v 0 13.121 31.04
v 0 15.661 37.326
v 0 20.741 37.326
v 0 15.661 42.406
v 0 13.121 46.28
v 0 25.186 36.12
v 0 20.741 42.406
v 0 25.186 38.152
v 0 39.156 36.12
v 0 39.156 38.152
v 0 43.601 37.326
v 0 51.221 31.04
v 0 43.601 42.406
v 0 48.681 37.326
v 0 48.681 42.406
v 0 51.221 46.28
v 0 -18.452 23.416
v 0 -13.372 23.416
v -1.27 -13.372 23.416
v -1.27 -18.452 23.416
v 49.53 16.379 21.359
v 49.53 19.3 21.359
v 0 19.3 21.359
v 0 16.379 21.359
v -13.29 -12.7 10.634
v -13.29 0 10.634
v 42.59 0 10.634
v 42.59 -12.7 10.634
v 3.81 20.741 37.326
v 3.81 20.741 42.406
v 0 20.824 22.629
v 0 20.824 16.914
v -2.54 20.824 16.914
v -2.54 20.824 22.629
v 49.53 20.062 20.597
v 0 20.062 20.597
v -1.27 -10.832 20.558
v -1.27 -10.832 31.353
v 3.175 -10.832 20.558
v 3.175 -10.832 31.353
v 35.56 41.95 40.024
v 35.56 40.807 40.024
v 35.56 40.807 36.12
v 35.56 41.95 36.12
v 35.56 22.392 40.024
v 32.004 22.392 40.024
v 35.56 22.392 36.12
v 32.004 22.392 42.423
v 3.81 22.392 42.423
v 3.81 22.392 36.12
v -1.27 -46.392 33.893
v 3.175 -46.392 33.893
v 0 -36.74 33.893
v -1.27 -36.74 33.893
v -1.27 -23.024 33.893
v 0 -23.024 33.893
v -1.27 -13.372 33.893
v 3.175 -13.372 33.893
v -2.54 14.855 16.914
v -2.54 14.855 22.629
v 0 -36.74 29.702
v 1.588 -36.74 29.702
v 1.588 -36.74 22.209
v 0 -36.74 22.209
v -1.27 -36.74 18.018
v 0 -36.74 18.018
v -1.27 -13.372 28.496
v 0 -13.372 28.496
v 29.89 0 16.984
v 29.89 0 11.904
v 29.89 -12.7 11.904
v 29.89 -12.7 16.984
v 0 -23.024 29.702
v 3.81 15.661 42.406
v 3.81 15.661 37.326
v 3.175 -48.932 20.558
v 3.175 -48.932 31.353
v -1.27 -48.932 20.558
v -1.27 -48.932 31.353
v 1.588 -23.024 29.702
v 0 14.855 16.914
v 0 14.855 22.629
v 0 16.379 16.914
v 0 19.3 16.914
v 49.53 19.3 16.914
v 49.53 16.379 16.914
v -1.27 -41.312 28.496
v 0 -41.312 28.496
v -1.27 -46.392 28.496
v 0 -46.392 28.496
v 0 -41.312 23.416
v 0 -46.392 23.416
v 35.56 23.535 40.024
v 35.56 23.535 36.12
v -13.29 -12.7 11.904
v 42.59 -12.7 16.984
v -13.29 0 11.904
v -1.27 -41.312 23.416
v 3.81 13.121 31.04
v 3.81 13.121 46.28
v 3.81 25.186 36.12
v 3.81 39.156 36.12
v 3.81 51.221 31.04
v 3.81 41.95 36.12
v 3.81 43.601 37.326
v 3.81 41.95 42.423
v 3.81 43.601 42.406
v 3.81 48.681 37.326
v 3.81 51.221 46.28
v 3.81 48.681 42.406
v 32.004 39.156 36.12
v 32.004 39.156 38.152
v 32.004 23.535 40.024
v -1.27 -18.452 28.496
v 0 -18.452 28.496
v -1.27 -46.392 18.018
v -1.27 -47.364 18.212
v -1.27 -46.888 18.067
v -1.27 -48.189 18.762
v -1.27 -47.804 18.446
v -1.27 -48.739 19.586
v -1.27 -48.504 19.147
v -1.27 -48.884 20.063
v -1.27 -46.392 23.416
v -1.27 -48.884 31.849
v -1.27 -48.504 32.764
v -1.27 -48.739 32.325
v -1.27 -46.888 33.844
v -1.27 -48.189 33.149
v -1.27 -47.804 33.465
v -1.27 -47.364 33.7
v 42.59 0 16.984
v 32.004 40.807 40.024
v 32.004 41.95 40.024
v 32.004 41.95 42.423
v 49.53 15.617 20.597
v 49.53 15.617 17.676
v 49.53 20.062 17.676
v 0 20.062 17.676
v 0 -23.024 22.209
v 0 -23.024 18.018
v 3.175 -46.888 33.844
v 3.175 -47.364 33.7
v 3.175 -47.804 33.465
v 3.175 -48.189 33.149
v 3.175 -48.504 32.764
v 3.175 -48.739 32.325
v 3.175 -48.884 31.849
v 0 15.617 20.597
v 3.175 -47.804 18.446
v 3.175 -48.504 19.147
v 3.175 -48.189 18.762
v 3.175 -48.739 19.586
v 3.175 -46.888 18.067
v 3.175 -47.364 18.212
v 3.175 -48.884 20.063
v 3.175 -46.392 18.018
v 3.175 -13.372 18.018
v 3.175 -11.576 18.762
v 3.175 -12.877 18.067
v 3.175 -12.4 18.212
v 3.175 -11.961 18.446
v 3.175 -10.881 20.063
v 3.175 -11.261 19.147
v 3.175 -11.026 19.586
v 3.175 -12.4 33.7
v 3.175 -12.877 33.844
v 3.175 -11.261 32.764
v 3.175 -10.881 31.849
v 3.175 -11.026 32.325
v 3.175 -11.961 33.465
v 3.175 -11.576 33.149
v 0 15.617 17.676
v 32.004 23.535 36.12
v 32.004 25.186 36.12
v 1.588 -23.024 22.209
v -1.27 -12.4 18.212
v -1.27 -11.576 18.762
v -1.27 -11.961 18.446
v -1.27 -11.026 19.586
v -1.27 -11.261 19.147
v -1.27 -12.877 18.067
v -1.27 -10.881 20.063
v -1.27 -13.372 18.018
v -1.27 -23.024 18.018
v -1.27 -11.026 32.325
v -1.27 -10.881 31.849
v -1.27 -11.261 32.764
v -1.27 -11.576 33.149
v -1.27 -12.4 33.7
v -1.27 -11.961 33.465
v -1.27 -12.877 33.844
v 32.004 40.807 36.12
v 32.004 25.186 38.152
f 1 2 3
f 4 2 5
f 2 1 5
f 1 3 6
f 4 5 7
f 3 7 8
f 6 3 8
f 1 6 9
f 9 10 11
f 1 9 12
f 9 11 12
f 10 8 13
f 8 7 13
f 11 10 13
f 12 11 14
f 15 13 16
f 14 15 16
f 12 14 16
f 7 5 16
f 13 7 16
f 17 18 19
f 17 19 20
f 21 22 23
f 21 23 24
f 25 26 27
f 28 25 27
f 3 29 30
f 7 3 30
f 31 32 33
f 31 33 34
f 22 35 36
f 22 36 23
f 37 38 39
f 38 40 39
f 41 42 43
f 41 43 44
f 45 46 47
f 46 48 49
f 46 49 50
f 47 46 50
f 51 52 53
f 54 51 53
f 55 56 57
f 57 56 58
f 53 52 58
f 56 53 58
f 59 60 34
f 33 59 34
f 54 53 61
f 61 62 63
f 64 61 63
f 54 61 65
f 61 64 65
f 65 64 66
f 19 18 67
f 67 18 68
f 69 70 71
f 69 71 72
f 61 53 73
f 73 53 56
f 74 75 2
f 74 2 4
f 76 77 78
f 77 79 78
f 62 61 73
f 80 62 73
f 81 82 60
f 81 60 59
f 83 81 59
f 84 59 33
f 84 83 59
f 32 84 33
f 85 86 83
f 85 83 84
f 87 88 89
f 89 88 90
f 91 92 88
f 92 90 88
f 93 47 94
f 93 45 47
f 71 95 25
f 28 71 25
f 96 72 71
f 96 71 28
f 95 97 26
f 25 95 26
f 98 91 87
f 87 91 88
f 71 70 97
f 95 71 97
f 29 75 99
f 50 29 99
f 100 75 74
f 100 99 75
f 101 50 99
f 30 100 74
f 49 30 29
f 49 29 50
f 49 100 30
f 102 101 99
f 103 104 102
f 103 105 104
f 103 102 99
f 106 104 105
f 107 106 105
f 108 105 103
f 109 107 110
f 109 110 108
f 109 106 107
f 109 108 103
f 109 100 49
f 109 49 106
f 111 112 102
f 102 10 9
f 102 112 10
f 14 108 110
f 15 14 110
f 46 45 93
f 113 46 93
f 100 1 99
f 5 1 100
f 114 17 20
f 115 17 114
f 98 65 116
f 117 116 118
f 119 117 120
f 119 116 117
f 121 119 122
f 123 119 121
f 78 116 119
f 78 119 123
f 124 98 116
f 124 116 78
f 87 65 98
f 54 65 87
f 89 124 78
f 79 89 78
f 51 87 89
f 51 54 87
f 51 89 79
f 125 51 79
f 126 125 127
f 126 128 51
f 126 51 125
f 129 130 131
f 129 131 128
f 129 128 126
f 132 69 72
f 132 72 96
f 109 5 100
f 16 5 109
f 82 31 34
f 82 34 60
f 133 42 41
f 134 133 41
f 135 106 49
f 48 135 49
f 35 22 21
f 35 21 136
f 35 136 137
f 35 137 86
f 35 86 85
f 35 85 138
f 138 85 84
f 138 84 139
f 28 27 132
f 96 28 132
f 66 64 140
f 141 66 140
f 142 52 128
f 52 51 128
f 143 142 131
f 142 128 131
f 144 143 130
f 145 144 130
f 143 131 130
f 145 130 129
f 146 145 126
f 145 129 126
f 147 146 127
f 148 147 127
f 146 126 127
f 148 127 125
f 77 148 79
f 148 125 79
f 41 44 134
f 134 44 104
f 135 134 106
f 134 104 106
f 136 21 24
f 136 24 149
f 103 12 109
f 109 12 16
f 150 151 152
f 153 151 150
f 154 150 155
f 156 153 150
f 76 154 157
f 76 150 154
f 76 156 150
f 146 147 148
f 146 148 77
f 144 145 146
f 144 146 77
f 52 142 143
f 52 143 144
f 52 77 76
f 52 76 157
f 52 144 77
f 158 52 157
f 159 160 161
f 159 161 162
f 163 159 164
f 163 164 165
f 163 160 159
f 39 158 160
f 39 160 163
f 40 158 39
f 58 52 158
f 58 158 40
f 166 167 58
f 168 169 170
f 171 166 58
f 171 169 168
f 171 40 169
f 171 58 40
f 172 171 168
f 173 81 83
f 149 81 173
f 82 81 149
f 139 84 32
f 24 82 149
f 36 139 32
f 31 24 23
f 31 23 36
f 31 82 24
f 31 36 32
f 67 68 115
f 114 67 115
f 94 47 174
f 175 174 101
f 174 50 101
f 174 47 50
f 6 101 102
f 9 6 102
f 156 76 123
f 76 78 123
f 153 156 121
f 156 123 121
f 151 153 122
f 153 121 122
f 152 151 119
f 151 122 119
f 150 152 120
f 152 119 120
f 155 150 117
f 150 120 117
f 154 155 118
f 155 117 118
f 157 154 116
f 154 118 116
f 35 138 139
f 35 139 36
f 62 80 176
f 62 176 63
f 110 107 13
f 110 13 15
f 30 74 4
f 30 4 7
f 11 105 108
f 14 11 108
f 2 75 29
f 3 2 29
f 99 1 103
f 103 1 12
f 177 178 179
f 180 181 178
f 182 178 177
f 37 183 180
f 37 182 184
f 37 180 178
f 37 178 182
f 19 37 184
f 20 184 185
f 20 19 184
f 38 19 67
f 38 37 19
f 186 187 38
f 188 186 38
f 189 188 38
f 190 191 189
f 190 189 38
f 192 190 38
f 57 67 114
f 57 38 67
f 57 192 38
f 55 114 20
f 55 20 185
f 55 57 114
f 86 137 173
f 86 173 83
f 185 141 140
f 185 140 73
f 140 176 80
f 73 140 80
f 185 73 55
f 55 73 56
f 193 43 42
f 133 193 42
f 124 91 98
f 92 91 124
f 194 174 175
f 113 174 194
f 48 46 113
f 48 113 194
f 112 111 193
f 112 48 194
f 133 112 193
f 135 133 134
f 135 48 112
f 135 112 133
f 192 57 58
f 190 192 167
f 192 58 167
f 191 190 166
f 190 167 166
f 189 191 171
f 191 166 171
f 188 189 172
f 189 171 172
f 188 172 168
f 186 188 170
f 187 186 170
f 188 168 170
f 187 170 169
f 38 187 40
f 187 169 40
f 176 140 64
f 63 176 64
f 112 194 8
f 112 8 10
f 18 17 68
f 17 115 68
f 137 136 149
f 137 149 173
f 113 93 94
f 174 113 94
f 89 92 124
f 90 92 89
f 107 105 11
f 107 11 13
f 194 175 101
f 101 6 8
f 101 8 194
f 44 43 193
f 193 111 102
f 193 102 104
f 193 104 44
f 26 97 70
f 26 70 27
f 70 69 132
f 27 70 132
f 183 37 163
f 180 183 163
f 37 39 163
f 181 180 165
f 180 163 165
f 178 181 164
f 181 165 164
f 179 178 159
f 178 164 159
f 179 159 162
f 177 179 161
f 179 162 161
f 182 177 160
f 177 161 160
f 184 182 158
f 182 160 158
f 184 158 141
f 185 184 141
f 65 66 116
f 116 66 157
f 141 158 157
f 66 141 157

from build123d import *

# Parameters (mm, degrees)
F0_W      = 12.7
F0_H      = 5.08
F1_DEPTH  = 12.7
F3_DEPTH  = 3.175
F4_W      = 6.858
F4_H      = 7.493
F5_DEPTH  = 1.5875
F4_W_2    = 5.08
F4_H_2    = 5.08
F6_DEPTH  = 1.27
F8_DEPTH  = 49.53
F9_DEPTH  = 2.54
F10_W     = 38.1
F10_H     = 15.24
F11_DEPTH = 3.81
F12_W     = 5.08
F12_H     = 5.08
F13_DEPTH = 10.16
F14_DEPTH = 31.75
F15_W     = 1.143
F15_H     = 2.398644
F16_DEPTH = 3.556


with BuildPart() as f1:
    # F0 (on Front) → F1 (new body)
    with BuildSketch(Plane.XZ):
        with Locations((36.240261, 14.444349)):
            Rectangle(F0_W, F0_H)
        Polygon((29.890261, 11.904349), (-13.289739, 11.904349), (-13.289739, 10.634349), (42.590261, 10.634349), (42.590261, 11.904349), align=None)
    extrude(amount=F1_DEPTH)


with BuildPart() as f3:
    # F2 (on Right) → F3 (new body)
    with BuildSketch(Plane.YZ):
        with BuildLine():
            Line((-13.372463, 33.893205), (-46.392463, 33.893205))
            ThreePointArc((-46.392463, 33.893205), (-48.188514, 33.149256), (-48.932463, 31.353205))
            Line((-48.932463, 31.353205), (-48.932463, 20.558205))
            ThreePointArc((-48.932463, 20.558205), (-48.188514, 18.762153), (-46.392463, 18.018205))
            Line((-46.392463, 18.018205), (-13.372463, 18.018205))
            ThreePointArc((-13.372463, 18.018205), (-11.576412, 18.762153), (-10.832463, 20.558205))
            Line((-10.832463, 20.558205), (-10.832463, 31.353205))
            ThreePointArc((-10.832463, 31.353205), (-11.576412, 33.149256), (-13.372463, 33.893205))
        make_face()
    extrude(amount=F3_DEPTH)

    # F4 (on face) → F5 (cut)
    with BuildSketch(Plane(origin=(0, 0, 0), x_dir=(0, -1, 0), z_dir=(-1, 0, 0))):
        with Locations((26.453463, 25.955705)):
            Rectangle(F4_W, F4_H)
        with Locations((33.311463, 25.955705)):
            Rectangle(F4_W, F4_H)
    extrude(amount=-F5_DEPTH, mode=Mode.SUBTRACT)

    # F4 (on face) → F6 (join)
    with BuildSketch(Plane(origin=(0, 0, 0), x_dir=(0, -1, 0), z_dir=(-1, 0, 0))):
        with BuildLine():
            Line((23.024463, 22.209205), (23.024463, 29.702205))
            Line((23.024463, 29.702205), (23.024463, 33.893205))
            Line((23.024463, 33.893205), (13.372463, 33.893205))
            ThreePointArc((13.372463, 33.893205), (11.576412, 33.149256), (10.832463, 31.353205))
            Line((10.832463, 31.353205), (10.832463, 22.209205))
            Line((10.832463, 22.209205), (23.024463, 22.209205))
        make_face()
        with Locations((15.912463, 25.955705)):
            Rectangle(F4_W_2, F4_H_2, mode=Mode.SUBTRACT)
        with BuildLine():
            Line((23.024463, 18.018205), (23.024463, 22.209205))
            Line((23.024463, 22.209205), (10.832463, 22.209205))
            Line((10.832463, 22.209205), (10.832463, 20.558205))
            ThreePointArc((10.832463, 20.558205), (11.576412, 18.762153), (13.372463, 18.018205))
            Line((13.372463, 18.018205), (23.024463, 18.018205))
        make_face()
        with BuildLine():
            Line((48.932463, 22.209205), (36.740463, 22.209205))
            Line((36.740463, 22.209205), (36.740463, 18.018205))
            Line((36.740463, 18.018205), (46.392463, 18.018205))
            ThreePointArc((46.392463, 18.018205), (48.188514, 18.762153), (48.932463, 20.558205))
            Line((48.932463, 20.558205), (48.932463, 22.209205))
        make_face()
        with BuildLine():
            Line((36.740463, 33.893205), (36.740463, 29.702205))
            Line((36.740463, 29.702205), (36.740463, 22.209205))
            Line((36.740463, 22.209205), (48.932463, 22.209205))
            Line((48.932463, 22.209205), (48.932463, 23.415705))
            Line((48.932463, 23.415705), (48.932463, 31.353205))
            ThreePointArc((48.932463, 31.353205), (48.188514, 33.149256), (46.392463, 33.893205))
            Line((46.392463, 33.893205), (36.740463, 33.893205))
        make_face()
        with Locations((43.852463, 25.955705)):
            Rectangle(F4_W_2, F4_H_2, mode=Mode.SUBTRACT)
    extrude(amount=F6_DEPTH)


with BuildPart() as f8:
    # F7 (on Right) → F8 (new body)
    with BuildSketch(Plane.YZ):
        Polygon((19.29993, 21.358911), (16.37893, 21.358911), (15.61693, 20.596911), (15.61693, 19.136411), (15.61693, 17.675911), (16.37893, 16.913911), (17.83943, 16.913911), (19.29993, 16.913911), (20.06193, 17.675911), (20.06193, 20.596911), align=None)
    extrude(amount=F8_DEPTH)

    # F7 (on Right) → F9 (join)
    with BuildSketch(Plane.YZ):
        Polygon((20.06193, 22.628911), (20.06193, 21.358911), (20.06193, 20.596911), (20.06193, 17.675911), (20.06193, 16.913911), (20.82393, 16.913911), (20.82393, 22.628911), align=None)
        Polygon((19.29993, 21.358911), (16.37893, 21.358911), (15.61693, 20.596911), (15.61693, 19.136411), (15.61693, 17.675911), (16.37893, 16.913911), (17.83943, 16.913911), (19.29993, 16.913911), (20.06193, 17.675911), (20.06193, 20.596911), align=None)
        Polygon((20.06193, 16.913911), (20.06193, 17.675911), (19.29993, 16.913911), align=None)
        Polygon((16.37893, 16.913911), (15.61693, 17.675911), (15.61693, 16.913911), align=None)
        Polygon((16.37893, 21.358911), (15.61693, 21.358911), (15.61693, 20.596911), align=None)
        Polygon((20.06193, 21.358911), (19.29993, 21.358911), (20.06193, 20.596911), align=None)
        Polygon((15.61693, 20.596911), (15.61693, 21.358911), (16.37893, 21.358911), (19.29993, 21.358911), (20.06193, 21.358911), (20.06193, 22.628911), (14.85493, 22.628911), (14.85493, 16.913911), (15.61693, 16.913911), (15.61693, 17.675911), (15.61693, 19.136411), align=None)
    extrude(amount=-F9_DEPTH)


with BuildPart() as f11:
    # F10 (on Right) → F11 (new body)
    with BuildSketch(Plane.YZ):
        with Locations((32.171498, 38.659832)):
            Rectangle(F10_W, F10_H)
    extrude(amount=F11_DEPTH)

    # F12 (on face) → F13 (cut)
    with BuildSketch(Plane.YZ.offset(3.81)):
        Polygon((32.171498, 38.151832), (25.186498, 38.151832), (25.186498, 36.119832), (32.171498, 36.119832), (39.156498, 36.119832), (39.156498, 38.151832), align=None)
        with Locations((46.141498, 39.866332)):
            Rectangle(F12_W, F12_H)
        with Locations((18.201498, 39.866332)):
            Rectangle(F12_W, F12_H)
    extrude(amount=-F13_DEPTH, mode=Mode.SUBTRACT)

    # F12 (on face) → F14 (join)
    with BuildSketch(Plane.YZ.offset(3.81)):
        Polygon((25.186498, 36.119832), (25.186498, 38.151832), (32.171498, 38.151832), (32.171498, 42.422619), (22.392498, 42.422619), (22.392498, 36.119832), align=None)
        Polygon((32.171498, 42.422619), (32.171498, 38.151832), (39.156498, 38.151832), (39.156498, 36.119832), (41.950498, 36.119832), (41.950498, 42.422619), align=None)
    extrude(amount=F14_DEPTH)

    # F15 (on face) → F16 (cut)
    with BuildSketch(Plane.YZ.offset(35.56)):
        Polygon((32.171498, 42.422619), (23.535498, 42.422619), (23.535498, 40.023975), (23.535498, 36.119832), (25.186498, 36.119832), (25.186498, 38.151832), (39.156498, 38.151832), (39.156498, 36.119832), (40.807498, 36.119832), (40.807498, 40.023975), (40.807498, 42.422619), align=None)
        with Locations((22.963998, 41.223297)):
            Rectangle(F15_W, F15_H)
        with Locations((41.378998, 41.223297)):
            Rectangle(F15_W, F15_H)
    extrude(amount=-F16_DEPTH, mode=Mode.SUBTRACT)


solid = Compound([f1.part, f3.part, f8.part, f11.part])
